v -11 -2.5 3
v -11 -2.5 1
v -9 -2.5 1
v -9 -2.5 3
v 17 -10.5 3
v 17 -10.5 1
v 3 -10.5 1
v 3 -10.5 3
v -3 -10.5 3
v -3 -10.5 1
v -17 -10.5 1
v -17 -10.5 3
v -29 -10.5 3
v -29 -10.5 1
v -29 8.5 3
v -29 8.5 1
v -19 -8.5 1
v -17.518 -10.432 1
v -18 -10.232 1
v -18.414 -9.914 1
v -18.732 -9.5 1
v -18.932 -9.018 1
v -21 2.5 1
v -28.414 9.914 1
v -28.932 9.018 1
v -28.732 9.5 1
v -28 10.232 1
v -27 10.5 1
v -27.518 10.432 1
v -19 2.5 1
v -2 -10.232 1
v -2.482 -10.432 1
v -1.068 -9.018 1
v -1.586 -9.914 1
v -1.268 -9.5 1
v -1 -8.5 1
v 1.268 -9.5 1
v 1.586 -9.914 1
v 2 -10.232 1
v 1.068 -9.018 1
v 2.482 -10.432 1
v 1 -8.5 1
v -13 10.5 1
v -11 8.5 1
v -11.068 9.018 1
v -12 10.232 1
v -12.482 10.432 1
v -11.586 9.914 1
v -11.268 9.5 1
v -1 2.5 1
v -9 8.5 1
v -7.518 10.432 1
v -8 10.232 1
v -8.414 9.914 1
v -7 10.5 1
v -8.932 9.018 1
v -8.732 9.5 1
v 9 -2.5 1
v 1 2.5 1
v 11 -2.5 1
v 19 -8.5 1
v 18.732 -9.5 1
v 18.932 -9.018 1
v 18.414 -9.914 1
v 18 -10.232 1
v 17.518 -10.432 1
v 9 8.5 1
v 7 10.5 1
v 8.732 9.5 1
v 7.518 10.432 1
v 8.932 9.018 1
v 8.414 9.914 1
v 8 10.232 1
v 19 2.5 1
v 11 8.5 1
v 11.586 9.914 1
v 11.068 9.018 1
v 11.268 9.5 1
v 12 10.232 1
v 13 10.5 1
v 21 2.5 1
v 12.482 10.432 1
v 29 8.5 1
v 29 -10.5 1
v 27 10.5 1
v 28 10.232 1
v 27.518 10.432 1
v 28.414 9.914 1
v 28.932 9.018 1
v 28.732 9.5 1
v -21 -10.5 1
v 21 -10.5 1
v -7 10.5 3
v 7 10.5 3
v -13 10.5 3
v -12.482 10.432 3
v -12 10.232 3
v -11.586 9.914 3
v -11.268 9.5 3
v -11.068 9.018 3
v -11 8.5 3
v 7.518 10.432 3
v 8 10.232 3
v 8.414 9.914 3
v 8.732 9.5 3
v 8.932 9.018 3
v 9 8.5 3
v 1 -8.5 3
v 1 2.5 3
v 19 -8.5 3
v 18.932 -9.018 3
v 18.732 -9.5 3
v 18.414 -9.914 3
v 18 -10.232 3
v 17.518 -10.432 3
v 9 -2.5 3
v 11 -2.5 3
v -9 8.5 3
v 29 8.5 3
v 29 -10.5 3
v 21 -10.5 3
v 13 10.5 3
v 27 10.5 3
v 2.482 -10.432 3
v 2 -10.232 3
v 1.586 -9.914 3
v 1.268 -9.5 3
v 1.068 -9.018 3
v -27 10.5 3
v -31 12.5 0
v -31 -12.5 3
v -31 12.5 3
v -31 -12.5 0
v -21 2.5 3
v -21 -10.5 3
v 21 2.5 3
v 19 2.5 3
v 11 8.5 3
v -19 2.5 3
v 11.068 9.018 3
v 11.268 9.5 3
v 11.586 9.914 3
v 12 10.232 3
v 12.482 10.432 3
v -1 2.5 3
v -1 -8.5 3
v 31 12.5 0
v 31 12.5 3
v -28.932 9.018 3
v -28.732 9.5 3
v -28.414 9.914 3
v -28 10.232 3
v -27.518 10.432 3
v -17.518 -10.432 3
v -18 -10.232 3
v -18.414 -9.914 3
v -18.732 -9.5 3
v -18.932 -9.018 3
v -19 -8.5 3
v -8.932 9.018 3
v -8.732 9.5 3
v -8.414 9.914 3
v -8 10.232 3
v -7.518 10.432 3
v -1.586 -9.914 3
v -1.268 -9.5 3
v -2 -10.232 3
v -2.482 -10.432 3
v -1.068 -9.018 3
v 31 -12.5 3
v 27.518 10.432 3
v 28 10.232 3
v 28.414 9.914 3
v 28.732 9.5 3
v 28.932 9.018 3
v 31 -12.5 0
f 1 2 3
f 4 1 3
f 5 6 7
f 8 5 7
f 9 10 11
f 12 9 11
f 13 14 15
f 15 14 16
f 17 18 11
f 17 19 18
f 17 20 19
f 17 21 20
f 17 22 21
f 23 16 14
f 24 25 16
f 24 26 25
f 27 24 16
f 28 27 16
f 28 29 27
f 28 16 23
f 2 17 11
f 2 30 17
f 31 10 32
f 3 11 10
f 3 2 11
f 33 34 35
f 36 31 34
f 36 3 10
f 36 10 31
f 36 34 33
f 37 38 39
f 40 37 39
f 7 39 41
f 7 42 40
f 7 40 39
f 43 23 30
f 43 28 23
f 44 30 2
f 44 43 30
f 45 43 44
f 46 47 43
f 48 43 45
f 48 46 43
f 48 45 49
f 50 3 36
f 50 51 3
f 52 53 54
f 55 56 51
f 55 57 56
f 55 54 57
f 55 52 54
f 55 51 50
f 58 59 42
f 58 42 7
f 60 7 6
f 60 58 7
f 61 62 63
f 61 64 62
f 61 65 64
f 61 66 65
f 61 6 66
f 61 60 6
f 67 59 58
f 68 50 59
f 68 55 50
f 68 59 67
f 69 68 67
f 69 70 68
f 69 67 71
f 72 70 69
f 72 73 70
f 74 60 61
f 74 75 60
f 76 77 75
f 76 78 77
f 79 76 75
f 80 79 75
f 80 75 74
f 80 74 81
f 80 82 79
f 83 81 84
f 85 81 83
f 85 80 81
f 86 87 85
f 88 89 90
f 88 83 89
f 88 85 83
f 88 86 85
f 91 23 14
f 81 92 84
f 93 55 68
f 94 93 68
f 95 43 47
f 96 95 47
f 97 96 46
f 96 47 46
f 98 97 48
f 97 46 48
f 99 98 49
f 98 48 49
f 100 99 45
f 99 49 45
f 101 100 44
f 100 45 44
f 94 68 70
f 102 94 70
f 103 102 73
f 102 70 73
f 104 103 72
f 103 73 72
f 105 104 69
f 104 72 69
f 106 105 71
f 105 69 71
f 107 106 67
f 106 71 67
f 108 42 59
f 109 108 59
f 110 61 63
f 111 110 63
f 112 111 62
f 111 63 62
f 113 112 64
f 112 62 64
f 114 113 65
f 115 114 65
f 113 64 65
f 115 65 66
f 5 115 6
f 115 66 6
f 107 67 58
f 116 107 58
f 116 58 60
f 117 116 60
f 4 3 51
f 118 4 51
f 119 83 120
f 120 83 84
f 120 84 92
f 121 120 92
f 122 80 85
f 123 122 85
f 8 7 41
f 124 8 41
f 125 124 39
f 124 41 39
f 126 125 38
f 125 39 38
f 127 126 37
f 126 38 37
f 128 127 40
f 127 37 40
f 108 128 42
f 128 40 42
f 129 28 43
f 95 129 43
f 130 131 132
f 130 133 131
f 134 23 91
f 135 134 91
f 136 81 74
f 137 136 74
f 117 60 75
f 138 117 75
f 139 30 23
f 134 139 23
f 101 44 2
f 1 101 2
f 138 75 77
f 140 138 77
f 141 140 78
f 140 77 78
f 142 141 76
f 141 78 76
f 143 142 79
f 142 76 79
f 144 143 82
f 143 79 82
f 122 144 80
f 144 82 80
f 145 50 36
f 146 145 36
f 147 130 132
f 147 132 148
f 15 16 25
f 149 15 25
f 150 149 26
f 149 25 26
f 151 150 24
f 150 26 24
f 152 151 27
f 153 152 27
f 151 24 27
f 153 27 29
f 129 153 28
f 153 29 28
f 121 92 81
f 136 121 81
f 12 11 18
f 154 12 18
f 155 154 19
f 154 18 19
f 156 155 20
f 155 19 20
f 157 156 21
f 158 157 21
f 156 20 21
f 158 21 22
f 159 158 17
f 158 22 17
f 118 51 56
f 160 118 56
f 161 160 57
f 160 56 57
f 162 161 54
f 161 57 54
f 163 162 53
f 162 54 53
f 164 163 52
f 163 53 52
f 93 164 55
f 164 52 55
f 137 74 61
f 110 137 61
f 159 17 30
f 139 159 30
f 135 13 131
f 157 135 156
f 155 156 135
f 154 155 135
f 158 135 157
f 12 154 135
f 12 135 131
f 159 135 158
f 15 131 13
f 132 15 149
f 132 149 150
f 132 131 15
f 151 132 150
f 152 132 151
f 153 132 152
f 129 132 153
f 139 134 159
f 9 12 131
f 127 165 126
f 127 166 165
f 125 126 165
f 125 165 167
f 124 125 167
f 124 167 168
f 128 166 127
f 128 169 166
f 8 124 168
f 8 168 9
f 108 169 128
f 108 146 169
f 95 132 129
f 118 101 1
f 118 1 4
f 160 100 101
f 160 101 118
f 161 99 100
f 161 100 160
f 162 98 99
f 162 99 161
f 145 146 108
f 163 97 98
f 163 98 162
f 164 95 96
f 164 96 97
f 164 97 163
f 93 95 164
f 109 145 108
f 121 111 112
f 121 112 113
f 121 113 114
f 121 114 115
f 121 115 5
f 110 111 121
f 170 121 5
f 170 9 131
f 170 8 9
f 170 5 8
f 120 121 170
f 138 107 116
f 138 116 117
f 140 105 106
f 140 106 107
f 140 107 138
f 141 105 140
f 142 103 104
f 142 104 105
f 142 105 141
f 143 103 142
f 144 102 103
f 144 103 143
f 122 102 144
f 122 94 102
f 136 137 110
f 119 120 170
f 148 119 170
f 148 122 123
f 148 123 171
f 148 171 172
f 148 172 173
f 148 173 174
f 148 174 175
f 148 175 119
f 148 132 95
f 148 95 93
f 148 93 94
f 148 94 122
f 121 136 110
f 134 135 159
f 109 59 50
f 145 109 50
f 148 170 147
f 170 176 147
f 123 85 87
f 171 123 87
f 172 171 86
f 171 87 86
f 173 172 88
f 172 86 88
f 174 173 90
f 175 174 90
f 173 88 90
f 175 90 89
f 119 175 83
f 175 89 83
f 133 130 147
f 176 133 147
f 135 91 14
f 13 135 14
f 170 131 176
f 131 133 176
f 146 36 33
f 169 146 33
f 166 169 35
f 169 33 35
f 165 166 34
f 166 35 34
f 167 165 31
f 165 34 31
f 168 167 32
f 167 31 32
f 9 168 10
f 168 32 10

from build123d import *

# Parameters (mm, degrees)
F0_W     = 62
F0_H     = 25
F1_DEPTH = 1
F2_W     = 62
F2_H     = 25
F3_DEPTH = 2


# Not quite as in the source:
# - a feature names something its author has since deleted; it is built from what else it names


with BuildPart() as f1:
    # F0 (on Top) → F1 (new body)
    with BuildSketch(Plane.XY):
        Rectangle(F0_W, F0_H)
    extrude(amount=F1_DEPTH)

    # F2 (on face) → F3 (join)
    with BuildSketch(Plane.XY.offset(1)):
        Rectangle(F2_W, F2_H)
        with BuildLine():
            ThreePointArc((-29, 8.5), (-28.4142135624, 9.9142135624), (-27, 10.5))
            Line((-27, 10.5), (-13, 10.5))
            ThreePointArc((-13, 10.5), (-11.5857864376, 9.9142135624), (-11, 8.5))
            Line((-11, 8.5), (-11, -2.5))
            Line((-11, -2.5), (-9, -2.5))
            Line((-9, -2.5), (-9, 8.5))
            ThreePointArc((-9, 8.5), (-8.4142135624, 9.9142135624), (-7, 10.5))
            Line((-7, 10.5), (7, 10.5))
            ThreePointArc((7, 10.5), (8.4142135624, 9.9142135624), (9, 8.5))
            Line((9, 8.5), (9, -2.5))
            Line((9, -2.5), (11, -2.5))
            Line((11, -2.5), (11, 8.5))
            ThreePointArc((11, 8.5), (11.5857864376, 9.9142135624), (13, 10.5))
            Line((13, 10.5), (27, 10.5))
            ThreePointArc((27, 10.5), (28.4142135624, 9.9142135624), (29, 8.5))
            Line((29, 8.5), (29, -10.5))
            Line((29, -10.5), (21, -10.5))
            Line((21, -10.5), (21, 2.5))
            Line((21, 2.5), (19, 2.5))
            Line((19, 2.5), (19, -8.5))
            ThreePointArc((19, -8.5), (18.4142135624, -9.9142135624), (17, -10.5))
            Line((17, -10.5), (3, -10.5))
            ThreePointArc((3, -10.5), (1.5857864376, -9.9142135624), (1, -8.5))
            Line((1, -8.5), (1, 2.5))
            Line((1, 2.5), (-1, 2.5))
            Line((-1, 2.5), (-1, -8.5))
            ThreePointArc((-1, -8.5), (-1.5857864376, -9.9142135624), (-3, -10.5))
            Line((-3, -10.5), (-17, -10.5))
            ThreePointArc((-17, -10.5), (-18.4142135624, -9.9142135624), (-19, -8.5))
            Line((-19, -8.5), (-19, 2.5))
            Line((-19, 2.5), (-21, 2.5))
            Line((-21, 2.5), (-21, -10.5))
            Line((-21, -10.5), (-29, -10.5))
            Line((-29, -10.5), (-29, 8.5))
        make_face(mode=Mode.SUBTRACT)
    extrude(amount=F3_DEPTH)


solid = f1.part
